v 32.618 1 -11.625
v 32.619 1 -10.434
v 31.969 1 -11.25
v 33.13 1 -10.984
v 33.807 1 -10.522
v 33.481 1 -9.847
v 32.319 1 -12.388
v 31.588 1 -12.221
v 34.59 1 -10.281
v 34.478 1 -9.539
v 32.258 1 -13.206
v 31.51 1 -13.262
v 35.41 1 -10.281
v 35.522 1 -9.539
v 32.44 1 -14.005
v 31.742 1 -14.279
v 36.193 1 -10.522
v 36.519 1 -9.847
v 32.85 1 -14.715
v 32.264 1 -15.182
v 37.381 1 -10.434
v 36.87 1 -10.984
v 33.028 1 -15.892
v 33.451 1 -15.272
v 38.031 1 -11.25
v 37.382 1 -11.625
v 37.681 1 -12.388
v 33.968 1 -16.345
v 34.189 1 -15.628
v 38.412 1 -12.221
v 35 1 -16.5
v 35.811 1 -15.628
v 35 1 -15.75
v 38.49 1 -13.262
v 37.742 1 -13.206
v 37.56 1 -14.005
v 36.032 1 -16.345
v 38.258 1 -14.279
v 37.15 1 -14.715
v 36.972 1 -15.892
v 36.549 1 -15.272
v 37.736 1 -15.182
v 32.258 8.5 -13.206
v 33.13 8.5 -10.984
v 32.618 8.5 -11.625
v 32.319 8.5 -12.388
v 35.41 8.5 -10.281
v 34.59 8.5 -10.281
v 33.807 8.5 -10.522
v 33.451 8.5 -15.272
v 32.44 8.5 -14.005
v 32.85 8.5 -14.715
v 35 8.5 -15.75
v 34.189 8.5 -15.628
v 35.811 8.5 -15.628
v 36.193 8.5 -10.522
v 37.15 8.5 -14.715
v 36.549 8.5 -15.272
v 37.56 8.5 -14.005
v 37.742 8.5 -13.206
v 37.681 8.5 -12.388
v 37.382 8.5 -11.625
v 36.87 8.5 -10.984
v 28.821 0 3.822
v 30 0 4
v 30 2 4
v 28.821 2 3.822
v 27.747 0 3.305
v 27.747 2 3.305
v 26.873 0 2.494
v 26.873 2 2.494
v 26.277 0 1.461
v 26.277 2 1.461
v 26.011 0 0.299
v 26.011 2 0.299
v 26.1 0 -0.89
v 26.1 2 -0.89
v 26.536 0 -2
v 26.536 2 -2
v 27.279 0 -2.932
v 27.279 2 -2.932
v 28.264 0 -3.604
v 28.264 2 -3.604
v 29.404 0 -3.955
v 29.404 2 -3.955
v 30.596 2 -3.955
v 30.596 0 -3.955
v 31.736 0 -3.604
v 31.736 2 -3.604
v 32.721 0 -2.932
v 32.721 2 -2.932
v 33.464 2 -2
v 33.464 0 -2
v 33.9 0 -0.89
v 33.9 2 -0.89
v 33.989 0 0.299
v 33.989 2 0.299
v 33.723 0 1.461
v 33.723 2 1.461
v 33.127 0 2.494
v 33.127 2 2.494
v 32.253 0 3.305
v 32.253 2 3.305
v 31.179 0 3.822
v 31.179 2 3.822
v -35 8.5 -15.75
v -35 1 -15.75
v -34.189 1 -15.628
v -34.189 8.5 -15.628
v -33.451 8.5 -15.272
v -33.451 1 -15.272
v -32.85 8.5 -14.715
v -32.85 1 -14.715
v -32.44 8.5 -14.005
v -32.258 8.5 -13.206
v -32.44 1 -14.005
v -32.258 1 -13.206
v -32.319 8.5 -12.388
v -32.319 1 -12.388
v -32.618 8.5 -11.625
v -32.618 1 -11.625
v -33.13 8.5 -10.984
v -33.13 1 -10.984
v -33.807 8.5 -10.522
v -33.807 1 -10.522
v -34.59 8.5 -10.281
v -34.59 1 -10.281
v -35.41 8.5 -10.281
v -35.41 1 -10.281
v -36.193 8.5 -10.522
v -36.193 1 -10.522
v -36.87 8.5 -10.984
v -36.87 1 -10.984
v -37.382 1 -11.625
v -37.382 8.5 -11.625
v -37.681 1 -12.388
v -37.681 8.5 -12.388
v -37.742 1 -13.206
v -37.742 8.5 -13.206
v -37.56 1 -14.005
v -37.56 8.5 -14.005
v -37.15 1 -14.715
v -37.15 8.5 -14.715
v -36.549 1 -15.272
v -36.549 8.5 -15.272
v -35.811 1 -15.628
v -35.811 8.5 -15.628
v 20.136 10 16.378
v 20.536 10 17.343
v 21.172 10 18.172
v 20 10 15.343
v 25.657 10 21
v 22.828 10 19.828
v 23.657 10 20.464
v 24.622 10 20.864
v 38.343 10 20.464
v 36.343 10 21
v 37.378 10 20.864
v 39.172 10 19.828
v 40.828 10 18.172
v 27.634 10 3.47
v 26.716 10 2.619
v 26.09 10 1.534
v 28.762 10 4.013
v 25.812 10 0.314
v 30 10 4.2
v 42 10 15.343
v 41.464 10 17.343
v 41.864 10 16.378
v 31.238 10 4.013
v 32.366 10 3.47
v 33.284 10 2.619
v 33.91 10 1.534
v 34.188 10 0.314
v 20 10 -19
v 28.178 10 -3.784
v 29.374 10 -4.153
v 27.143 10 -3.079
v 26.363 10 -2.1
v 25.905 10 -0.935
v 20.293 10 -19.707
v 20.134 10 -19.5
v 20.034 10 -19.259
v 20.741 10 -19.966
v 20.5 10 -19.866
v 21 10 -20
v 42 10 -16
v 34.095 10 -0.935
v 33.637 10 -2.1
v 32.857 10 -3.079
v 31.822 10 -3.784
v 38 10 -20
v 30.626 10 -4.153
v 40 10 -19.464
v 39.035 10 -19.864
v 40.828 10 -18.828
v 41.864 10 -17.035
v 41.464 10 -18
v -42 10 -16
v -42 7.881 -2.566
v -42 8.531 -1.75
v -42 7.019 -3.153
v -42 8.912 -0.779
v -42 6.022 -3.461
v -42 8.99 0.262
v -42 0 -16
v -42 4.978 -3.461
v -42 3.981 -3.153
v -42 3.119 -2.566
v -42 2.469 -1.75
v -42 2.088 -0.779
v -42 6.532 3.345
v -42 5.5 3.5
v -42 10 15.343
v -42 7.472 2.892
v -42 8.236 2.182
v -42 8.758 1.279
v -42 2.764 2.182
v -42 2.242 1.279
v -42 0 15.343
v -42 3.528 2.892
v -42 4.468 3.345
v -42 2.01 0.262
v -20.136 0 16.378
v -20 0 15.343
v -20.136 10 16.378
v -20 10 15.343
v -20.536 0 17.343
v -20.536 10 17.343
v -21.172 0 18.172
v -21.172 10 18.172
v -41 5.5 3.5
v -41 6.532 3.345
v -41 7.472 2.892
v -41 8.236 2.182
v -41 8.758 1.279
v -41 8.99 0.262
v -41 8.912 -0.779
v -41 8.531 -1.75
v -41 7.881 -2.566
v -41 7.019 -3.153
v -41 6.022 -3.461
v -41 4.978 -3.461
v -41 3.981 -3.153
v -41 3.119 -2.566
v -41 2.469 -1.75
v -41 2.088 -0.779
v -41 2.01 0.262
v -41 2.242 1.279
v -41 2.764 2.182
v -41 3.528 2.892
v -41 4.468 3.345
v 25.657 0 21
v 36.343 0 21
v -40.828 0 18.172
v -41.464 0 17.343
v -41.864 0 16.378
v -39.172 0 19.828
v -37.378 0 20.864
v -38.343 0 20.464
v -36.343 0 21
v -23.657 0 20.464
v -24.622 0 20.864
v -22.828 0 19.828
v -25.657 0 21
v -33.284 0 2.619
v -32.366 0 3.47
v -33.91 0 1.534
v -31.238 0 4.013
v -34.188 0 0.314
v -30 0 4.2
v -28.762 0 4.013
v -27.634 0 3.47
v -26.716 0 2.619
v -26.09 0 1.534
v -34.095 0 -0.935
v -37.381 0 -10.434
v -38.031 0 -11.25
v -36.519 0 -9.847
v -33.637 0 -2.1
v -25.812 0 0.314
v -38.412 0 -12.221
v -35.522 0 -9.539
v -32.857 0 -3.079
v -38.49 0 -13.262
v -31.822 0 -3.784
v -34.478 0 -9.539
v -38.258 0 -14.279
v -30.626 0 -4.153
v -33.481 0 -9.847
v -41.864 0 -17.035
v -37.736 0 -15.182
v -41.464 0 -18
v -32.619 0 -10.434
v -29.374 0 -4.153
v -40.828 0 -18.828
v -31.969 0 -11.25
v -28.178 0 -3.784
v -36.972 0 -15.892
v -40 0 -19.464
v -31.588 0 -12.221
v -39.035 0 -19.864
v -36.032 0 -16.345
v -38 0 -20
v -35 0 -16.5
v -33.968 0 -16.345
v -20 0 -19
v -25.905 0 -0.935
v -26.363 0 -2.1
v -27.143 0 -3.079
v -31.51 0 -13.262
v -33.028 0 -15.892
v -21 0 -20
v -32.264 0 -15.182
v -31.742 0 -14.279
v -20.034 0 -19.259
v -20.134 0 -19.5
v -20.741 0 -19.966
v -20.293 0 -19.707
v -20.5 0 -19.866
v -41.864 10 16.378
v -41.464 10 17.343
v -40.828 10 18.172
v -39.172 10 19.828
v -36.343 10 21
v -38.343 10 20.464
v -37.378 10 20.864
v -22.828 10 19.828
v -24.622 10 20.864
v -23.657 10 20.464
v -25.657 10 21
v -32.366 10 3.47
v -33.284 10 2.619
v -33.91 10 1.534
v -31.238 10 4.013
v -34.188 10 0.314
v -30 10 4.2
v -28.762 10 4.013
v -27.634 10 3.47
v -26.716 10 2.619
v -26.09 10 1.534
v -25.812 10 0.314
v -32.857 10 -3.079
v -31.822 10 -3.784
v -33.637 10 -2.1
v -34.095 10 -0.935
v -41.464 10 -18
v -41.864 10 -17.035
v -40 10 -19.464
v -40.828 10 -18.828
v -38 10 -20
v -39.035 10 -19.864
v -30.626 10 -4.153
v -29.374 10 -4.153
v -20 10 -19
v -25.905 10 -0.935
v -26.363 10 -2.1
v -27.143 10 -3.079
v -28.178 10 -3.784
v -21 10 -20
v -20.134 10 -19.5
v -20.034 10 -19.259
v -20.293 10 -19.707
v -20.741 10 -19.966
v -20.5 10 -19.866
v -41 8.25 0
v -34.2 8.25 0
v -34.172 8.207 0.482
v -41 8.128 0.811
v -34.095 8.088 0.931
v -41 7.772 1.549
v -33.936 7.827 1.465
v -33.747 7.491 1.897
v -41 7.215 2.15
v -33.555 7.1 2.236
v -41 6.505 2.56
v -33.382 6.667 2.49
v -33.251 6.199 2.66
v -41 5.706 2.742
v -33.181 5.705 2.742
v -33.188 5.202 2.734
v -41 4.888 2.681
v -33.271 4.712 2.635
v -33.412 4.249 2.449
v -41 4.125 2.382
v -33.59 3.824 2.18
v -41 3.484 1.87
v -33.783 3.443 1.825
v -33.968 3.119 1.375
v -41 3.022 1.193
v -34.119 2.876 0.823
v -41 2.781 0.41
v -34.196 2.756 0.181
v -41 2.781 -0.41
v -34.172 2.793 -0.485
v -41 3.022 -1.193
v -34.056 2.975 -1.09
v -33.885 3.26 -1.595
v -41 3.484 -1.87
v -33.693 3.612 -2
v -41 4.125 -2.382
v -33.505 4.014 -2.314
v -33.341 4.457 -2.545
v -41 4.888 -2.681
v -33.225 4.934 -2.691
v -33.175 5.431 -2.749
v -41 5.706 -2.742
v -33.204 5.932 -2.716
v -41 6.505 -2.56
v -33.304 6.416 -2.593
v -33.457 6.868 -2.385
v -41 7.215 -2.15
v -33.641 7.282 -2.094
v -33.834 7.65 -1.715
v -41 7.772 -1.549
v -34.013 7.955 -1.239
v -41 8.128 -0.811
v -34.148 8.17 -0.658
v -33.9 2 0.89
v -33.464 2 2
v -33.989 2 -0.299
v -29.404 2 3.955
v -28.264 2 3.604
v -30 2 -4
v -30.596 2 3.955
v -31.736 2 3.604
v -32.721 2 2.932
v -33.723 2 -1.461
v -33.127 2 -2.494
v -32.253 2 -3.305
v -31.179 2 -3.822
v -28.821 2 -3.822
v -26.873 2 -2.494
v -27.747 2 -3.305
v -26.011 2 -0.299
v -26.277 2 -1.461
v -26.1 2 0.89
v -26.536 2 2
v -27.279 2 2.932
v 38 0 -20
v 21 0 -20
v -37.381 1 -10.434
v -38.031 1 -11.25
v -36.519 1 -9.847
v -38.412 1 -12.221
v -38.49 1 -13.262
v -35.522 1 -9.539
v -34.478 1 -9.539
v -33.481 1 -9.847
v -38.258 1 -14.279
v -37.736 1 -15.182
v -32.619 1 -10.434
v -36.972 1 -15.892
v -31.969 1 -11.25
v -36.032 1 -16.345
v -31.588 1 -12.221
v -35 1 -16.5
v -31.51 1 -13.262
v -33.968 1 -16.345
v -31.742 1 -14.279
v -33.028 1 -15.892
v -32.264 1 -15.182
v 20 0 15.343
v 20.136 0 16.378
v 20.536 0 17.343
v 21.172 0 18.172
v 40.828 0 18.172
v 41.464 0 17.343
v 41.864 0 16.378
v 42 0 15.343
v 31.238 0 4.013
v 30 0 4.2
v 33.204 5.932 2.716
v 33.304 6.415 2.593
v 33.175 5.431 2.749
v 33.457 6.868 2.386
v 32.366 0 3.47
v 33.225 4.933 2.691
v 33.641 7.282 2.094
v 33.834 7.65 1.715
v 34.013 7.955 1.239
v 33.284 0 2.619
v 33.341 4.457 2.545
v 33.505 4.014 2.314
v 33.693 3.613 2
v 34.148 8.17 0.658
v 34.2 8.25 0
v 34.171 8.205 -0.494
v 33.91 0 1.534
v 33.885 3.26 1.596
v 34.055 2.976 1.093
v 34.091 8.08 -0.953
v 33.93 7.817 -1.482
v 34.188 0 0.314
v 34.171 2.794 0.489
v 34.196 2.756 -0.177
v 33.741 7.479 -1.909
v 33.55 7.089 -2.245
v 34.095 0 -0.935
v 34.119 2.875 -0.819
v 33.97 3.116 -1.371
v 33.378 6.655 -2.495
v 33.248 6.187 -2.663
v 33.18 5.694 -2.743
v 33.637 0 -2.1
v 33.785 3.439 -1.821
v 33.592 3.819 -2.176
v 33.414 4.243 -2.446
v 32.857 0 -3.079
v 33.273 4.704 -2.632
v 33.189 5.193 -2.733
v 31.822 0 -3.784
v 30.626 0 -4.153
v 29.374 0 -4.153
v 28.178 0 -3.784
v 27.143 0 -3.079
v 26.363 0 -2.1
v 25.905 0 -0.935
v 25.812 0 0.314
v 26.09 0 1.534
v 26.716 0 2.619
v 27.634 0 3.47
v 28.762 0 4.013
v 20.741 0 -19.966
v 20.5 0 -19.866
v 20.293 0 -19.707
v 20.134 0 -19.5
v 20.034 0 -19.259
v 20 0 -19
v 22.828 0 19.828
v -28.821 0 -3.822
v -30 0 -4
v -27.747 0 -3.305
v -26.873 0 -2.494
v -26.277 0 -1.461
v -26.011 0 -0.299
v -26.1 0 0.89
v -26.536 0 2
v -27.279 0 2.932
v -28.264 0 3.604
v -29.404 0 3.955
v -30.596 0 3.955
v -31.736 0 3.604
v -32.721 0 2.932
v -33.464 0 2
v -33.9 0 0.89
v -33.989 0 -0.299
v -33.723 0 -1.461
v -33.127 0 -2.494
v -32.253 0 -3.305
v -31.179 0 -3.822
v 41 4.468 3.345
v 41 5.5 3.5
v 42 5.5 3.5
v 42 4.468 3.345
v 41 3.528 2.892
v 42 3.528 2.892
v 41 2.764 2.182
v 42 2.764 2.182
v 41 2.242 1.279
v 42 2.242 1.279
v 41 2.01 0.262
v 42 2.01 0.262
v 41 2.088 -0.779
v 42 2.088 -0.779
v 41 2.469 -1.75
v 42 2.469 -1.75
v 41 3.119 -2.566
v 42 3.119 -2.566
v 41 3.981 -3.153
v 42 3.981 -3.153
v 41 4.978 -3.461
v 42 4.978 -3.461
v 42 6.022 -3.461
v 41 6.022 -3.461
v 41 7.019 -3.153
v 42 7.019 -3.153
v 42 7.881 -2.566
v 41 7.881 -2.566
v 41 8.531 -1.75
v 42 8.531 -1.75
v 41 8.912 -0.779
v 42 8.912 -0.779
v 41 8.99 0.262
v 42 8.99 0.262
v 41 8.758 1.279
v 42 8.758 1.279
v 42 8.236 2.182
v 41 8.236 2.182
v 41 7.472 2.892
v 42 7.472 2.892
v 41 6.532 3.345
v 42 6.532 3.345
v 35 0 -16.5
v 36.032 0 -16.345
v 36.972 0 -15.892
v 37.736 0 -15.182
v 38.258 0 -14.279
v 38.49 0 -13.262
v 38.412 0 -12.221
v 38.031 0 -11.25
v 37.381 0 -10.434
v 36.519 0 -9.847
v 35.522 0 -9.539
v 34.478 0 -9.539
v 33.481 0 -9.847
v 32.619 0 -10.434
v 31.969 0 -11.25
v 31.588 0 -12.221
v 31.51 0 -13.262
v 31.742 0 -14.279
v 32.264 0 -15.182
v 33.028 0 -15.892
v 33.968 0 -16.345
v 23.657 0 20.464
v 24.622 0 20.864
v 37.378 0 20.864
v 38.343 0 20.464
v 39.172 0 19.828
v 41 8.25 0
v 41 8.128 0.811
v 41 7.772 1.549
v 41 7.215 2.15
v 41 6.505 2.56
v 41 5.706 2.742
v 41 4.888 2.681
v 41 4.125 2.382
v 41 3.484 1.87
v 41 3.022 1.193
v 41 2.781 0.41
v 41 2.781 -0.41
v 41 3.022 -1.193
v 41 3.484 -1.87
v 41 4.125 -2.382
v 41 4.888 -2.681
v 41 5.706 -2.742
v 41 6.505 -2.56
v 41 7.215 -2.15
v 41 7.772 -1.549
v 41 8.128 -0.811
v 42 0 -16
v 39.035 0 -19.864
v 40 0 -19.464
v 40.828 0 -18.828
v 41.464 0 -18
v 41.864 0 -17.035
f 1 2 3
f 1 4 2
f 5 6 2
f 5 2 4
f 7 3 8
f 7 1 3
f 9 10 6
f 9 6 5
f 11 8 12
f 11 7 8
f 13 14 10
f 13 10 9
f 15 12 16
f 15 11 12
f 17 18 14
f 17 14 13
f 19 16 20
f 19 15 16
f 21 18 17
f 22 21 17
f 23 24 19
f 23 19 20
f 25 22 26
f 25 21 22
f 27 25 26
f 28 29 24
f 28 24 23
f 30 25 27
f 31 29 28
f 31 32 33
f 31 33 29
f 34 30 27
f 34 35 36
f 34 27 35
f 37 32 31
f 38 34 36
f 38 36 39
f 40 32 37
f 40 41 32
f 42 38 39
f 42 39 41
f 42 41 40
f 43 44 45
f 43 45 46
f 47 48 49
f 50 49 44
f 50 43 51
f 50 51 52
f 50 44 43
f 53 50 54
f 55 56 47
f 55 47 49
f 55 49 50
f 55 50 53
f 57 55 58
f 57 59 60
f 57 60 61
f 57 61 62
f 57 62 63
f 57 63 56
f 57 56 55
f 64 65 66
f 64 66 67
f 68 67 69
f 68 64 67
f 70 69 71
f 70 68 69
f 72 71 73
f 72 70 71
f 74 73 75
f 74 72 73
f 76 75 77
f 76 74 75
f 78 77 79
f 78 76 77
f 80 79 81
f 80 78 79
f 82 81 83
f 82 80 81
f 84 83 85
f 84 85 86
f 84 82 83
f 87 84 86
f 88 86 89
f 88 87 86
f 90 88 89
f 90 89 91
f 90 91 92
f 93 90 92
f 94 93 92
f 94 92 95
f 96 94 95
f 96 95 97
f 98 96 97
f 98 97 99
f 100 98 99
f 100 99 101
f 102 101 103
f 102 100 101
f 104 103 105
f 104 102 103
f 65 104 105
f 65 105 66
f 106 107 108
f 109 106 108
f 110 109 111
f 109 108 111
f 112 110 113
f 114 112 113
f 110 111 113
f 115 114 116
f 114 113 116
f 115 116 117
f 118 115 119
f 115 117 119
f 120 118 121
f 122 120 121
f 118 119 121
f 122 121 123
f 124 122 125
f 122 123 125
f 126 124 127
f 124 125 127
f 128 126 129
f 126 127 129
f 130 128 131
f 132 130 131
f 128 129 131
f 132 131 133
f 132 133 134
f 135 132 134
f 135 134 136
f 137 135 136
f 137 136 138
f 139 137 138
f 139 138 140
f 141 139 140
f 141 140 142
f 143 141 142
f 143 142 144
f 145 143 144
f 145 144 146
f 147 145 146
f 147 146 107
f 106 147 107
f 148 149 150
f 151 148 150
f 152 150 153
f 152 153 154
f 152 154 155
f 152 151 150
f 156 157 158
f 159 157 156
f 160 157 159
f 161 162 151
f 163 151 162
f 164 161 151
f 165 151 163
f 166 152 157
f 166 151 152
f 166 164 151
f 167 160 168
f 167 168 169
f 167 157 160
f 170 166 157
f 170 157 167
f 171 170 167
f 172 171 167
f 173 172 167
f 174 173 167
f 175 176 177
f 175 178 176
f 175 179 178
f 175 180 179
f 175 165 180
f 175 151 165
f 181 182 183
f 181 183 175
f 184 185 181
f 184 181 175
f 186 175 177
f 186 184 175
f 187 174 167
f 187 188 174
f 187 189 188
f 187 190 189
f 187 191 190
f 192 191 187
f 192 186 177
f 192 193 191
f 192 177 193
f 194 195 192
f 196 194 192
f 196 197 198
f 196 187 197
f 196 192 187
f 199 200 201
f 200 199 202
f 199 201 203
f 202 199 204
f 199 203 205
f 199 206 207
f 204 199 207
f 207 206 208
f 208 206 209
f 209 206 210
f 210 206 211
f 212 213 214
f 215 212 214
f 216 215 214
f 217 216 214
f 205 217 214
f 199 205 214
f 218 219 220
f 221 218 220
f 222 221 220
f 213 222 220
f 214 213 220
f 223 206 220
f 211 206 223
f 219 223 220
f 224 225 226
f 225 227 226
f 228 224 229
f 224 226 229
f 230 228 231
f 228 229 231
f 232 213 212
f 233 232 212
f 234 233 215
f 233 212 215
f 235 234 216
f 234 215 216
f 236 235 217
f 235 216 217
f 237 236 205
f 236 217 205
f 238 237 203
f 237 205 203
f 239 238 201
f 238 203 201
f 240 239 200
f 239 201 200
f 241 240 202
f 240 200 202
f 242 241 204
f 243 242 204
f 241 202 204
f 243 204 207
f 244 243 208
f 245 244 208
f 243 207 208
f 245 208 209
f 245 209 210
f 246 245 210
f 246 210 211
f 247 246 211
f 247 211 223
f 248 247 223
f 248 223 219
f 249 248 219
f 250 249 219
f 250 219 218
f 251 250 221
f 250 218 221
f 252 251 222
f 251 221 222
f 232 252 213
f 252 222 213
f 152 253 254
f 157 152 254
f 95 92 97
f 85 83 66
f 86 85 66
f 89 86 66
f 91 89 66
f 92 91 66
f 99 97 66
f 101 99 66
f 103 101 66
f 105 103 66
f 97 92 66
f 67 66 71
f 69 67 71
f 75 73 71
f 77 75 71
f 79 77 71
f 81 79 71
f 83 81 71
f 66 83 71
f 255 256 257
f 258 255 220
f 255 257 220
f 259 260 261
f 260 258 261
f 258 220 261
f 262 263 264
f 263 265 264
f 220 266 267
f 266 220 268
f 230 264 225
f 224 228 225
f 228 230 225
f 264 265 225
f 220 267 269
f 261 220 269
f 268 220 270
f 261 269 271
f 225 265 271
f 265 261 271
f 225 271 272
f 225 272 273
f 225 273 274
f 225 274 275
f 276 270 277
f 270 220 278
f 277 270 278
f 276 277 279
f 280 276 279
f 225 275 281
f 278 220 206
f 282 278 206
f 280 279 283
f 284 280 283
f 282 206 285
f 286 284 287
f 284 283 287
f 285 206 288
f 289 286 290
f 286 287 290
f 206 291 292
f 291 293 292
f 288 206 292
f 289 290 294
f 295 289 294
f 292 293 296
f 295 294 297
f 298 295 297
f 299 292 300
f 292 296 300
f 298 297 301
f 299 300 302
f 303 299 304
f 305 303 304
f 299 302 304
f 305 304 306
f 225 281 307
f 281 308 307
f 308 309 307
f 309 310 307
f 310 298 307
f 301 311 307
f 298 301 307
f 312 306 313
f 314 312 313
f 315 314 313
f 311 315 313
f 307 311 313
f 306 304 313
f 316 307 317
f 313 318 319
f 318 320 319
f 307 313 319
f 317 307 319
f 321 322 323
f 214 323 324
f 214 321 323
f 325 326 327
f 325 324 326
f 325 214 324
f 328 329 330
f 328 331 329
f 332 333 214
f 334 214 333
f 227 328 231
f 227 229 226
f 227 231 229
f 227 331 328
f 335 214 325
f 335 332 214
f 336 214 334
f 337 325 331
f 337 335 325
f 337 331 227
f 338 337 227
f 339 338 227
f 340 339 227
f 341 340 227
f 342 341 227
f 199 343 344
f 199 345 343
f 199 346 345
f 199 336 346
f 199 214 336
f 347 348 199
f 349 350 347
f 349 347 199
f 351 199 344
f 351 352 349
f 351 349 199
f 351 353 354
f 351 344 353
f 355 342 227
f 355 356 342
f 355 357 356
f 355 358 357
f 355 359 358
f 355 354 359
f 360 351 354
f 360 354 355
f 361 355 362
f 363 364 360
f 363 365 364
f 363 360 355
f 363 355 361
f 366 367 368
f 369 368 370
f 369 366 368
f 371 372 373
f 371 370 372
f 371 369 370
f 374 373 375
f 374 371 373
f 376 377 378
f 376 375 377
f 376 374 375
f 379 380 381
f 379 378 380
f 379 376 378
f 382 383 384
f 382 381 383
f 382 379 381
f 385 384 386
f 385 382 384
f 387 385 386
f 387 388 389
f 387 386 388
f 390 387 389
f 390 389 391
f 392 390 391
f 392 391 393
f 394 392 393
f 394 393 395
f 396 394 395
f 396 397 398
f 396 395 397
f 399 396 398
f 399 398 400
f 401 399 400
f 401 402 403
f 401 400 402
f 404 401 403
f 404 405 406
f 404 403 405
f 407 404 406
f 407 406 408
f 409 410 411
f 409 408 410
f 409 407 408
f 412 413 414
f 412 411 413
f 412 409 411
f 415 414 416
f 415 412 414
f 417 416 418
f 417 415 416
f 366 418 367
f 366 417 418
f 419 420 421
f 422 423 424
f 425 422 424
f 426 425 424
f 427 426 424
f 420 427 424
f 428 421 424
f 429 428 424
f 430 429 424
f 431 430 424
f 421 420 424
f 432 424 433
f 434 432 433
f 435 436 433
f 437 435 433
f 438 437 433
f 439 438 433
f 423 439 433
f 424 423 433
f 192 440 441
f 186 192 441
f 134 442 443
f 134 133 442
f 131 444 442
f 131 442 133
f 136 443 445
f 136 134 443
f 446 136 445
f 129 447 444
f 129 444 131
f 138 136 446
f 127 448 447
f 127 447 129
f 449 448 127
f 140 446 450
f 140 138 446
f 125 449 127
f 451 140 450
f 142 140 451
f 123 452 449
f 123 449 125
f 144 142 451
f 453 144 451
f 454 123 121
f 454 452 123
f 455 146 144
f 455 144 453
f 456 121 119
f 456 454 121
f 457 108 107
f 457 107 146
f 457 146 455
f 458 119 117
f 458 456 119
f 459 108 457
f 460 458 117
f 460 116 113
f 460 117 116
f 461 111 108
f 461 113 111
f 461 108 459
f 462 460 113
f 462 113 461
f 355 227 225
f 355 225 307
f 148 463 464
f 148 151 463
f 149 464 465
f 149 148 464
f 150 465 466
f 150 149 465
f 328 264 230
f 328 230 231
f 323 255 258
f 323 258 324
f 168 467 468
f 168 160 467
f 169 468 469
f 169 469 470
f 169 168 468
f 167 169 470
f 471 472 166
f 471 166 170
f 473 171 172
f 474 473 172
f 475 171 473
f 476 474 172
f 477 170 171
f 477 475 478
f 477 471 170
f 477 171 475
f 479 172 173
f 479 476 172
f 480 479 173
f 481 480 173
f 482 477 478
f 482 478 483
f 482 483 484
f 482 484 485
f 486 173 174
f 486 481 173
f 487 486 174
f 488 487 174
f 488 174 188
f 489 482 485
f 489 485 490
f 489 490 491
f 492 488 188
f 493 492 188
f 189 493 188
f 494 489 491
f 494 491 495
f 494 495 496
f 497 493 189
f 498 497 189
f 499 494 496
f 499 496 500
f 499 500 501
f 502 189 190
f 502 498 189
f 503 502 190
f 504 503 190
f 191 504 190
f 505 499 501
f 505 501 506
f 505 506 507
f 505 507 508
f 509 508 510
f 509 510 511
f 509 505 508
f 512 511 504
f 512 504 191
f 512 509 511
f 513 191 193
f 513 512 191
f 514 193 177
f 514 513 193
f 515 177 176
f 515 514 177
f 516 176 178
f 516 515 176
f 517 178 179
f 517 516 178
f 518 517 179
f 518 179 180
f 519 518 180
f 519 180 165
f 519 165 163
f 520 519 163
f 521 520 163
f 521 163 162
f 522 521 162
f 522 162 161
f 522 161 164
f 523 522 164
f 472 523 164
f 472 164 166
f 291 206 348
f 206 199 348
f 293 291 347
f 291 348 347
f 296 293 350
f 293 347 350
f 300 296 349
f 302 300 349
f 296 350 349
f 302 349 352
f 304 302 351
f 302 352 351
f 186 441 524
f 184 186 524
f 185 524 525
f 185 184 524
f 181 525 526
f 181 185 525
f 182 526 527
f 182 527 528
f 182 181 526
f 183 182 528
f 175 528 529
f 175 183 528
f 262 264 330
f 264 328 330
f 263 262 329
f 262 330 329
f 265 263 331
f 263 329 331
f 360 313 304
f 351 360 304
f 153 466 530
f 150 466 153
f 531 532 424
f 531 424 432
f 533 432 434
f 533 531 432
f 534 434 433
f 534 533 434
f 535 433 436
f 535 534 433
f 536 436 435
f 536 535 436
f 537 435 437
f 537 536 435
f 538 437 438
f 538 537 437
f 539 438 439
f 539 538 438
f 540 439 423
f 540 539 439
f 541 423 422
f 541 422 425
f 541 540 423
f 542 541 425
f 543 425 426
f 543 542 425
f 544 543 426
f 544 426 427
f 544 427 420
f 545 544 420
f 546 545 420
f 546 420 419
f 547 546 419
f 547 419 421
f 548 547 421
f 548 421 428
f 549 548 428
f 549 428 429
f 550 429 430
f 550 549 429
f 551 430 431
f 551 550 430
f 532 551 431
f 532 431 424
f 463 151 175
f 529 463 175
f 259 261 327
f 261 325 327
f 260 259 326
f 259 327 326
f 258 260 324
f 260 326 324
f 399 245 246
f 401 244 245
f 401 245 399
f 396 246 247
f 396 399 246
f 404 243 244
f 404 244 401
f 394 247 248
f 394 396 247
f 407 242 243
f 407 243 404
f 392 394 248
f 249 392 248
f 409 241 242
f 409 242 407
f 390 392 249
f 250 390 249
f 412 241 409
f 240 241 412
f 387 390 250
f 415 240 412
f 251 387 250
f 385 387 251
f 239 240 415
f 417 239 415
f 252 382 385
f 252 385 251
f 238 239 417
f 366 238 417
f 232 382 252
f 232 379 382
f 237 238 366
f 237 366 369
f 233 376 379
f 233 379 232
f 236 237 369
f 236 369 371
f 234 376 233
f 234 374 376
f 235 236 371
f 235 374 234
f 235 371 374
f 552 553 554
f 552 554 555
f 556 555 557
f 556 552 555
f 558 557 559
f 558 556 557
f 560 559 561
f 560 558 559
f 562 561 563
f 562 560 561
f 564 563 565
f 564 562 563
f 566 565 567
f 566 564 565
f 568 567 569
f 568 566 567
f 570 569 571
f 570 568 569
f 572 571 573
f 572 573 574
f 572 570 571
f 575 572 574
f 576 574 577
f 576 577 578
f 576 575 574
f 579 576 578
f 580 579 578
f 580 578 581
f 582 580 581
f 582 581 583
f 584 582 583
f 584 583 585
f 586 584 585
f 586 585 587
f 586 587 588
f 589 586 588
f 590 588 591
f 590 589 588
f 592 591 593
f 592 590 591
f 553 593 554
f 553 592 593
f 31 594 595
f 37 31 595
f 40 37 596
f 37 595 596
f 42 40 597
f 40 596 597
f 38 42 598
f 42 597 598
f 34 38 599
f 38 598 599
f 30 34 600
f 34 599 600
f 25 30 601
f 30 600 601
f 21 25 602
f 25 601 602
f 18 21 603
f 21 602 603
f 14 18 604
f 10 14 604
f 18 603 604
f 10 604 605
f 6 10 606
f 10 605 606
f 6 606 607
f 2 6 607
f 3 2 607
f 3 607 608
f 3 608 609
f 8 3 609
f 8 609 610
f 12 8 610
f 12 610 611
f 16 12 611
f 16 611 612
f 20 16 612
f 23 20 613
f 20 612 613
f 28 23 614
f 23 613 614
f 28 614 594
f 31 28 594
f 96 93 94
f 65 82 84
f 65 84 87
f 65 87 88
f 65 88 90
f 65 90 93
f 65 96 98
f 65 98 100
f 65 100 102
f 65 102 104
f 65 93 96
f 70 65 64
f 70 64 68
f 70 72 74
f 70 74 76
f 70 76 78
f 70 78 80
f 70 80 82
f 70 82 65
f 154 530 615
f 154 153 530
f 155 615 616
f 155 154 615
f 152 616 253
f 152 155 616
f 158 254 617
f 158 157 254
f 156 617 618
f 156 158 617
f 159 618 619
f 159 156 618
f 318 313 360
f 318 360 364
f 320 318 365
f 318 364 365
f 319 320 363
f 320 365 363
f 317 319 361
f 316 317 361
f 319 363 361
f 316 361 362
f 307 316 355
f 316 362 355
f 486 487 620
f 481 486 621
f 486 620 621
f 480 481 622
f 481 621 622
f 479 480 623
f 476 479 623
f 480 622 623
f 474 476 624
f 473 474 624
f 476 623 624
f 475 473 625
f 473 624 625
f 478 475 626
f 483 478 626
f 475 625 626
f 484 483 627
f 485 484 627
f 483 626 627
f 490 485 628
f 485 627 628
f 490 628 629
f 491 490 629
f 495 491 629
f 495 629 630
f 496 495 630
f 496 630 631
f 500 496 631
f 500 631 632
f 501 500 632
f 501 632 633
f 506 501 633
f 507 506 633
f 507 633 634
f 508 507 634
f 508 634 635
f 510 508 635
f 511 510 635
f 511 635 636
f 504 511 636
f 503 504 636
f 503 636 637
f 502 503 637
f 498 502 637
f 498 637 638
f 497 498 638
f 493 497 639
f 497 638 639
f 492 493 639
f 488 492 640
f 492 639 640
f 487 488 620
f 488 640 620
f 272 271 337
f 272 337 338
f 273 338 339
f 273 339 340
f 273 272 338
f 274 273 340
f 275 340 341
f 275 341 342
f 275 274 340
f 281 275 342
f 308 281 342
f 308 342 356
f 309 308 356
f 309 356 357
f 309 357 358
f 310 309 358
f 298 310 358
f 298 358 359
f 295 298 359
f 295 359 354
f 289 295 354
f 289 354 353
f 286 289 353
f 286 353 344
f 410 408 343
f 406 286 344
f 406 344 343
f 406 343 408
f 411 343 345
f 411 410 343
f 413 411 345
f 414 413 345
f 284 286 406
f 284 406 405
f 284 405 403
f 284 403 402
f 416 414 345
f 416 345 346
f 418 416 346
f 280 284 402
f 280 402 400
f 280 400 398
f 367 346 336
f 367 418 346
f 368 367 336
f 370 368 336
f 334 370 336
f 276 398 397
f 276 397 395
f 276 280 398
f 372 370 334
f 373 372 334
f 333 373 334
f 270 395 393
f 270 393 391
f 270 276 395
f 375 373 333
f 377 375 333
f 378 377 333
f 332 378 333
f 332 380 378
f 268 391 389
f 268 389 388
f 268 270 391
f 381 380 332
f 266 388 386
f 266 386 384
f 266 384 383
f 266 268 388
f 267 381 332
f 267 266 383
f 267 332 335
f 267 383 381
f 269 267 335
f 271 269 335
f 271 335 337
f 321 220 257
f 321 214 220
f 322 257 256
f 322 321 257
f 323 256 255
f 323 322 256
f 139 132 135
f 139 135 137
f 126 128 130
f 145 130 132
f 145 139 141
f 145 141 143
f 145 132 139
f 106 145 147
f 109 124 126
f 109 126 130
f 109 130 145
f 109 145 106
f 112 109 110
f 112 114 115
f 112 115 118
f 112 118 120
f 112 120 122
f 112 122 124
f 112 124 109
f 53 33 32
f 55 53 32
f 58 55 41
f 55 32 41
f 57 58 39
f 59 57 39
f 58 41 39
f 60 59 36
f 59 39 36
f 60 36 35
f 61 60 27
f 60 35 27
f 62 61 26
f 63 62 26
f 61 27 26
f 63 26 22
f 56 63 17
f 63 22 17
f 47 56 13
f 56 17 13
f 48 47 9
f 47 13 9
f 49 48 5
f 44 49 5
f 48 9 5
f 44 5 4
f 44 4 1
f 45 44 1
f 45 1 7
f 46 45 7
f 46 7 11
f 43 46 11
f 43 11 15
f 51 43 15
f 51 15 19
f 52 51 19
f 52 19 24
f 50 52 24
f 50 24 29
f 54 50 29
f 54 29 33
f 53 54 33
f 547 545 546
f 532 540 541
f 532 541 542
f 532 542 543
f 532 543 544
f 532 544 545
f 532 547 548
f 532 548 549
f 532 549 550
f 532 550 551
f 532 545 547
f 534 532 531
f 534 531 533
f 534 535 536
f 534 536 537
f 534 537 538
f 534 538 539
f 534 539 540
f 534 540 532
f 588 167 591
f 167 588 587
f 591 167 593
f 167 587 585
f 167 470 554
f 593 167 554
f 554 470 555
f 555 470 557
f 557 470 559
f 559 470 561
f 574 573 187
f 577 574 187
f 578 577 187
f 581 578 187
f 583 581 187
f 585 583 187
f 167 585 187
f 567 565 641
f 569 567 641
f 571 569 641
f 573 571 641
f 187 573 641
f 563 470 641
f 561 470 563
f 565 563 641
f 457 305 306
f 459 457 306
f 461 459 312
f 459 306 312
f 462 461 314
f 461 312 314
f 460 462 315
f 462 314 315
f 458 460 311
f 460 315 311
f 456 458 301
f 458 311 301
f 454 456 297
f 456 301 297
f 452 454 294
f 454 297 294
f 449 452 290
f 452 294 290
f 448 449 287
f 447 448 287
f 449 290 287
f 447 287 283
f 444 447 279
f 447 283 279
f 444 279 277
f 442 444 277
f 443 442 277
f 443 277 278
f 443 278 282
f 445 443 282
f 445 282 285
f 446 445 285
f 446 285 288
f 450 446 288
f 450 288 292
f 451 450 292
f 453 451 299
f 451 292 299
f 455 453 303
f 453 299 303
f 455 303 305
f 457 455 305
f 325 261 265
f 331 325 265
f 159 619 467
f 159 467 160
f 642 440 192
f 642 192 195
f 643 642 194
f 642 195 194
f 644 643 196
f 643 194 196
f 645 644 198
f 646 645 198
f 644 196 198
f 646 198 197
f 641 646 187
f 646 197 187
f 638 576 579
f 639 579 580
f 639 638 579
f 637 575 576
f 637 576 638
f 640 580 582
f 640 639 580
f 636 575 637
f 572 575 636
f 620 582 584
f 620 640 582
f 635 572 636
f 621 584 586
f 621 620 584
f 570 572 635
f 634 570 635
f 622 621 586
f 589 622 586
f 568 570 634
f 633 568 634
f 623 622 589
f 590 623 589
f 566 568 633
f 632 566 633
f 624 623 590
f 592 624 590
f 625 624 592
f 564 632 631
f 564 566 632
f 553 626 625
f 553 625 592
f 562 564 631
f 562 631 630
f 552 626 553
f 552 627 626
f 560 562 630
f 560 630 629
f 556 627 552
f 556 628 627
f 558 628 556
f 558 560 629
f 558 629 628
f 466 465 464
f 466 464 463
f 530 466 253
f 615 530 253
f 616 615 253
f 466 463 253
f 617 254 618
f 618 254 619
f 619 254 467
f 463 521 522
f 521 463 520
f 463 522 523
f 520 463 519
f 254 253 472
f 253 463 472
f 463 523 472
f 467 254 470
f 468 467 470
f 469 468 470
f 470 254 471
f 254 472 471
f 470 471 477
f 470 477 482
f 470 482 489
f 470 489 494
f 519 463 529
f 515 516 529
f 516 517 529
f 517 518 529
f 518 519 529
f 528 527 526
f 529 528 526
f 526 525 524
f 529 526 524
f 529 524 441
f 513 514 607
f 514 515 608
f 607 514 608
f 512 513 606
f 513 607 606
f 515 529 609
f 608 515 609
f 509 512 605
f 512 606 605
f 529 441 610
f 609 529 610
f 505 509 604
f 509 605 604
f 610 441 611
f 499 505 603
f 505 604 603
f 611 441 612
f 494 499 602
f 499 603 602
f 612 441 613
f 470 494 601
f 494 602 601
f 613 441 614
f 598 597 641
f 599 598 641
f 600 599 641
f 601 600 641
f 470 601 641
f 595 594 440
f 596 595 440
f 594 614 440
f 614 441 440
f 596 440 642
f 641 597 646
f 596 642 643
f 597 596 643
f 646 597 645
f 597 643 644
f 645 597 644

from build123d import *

# Parameters (mm, degrees)
ESQUISSE1_R                 = 4.2
BOSS_EXTRU_1_DEPTH          = 10
CHANFREIN3_SIZE             = 4
CONG_2_R                    = 4
ESQUISSE3_R                 = 4
BOSS_EXTRU_2_DEPTH          = 2
BOSS_EXTRU_2_2_DEPTH        = 2
ENL_V_START                 = -42
ENL_V_MAT_EXTRU_4_OUTLINE_R = 2.75
ENL_V_MAT_EXTRU_4_DEPTH     = 8.825492271
CONG_4_R                    = 4
ESQUISSE7_R                 = 2.75
ENL_V_MAT_EXTRU_5_DEPTH     = 8.5
ESQUISSE7_4_R               = 3.5
ESQUISSE7_4_R_2             = 2.75
ENL_V_MAT_EXTRU_8_DEPTH     = 1
ESQUISSE8_R                 = 3.5
ENL_V_MAT_EXTRU_9_DEPTH     = 1
ENL_V_START_2               = -1
ESQUISSE9_R                 = 3.5
ENL_V_MAT_EXTRU_10_DEPTH    = 1
ESQUISSE10_W                = 40
ESQUISSE10_H                = 50.736146746
ENL_V_MAT_EXTRU_11_DEPTH    = 10
CONG_5_R                    = 1
CONG_6_R                    = 1


# Read off the part's stored shape, not the designer's step: Enlèv. mat.-Extru.4
with BuildPart() as part:
    # Esquisse1 → Boss.-Extru.1 (new body)
    # profile 1 of 4: a face of its own
    with BuildSketch(Plane(origin=(0, 0, 0), x_dir=(1, 0, 0), z_dir=(0, 1, 0))):
        Polygon((-20, 6.5), (-20, 12), (-20, 13.5), (-15, 13.5), (0, 13.5), (0, 20), (-42, 20), (-42, 12), (-42, 0), (-42, -21), (-20, -21), align=None)
        with Locations(Location((-30, 0, 0), (0, 0, 270))):
            Circle(ESQUISSE1_R, mode=Mode.SUBTRACT)
    # profile 2 of 4: a face of its own
    with BuildSketch(Plane(origin=(0, 0, 0), x_dir=(1, 0, 0), z_dir=(0, 1, 0))):
        Polygon((0, 20), (0, 13.5), (15, 13.5), (20, 13.5), (20, 12), (20, 6.5), (20, -21), (42, -21), (42, 0), (42, 12), (42, 20), align=None)
        with Locations(Location((30, 0, 0), (0, 0, 270))):
            Circle(ESQUISSE1_R, mode=Mode.SUBTRACT)
    # profile 3 of 4: a face of its own
    with BuildSketch(Plane(origin=(0, 0, 0), x_dir=(1, 0, 0), z_dir=(0, 1, 0))):
        Polygon((-20, 13.5), (-20, 12), (-20, 6.5), (-15, 13.5), align=None)
    # profile 4 of 4: a face of its own
    with BuildSketch(Plane(origin=(0, 0, 0), x_dir=(1, 0, 0), z_dir=(0, 1, 0))):
        Polygon((20, 13.5), (15, 13.5), (20, 6.5), (20, 12), align=None)
    extrude(amount=BOSS_EXTRU_1_DEPTH)

    # Chanfrein3
    chanfrein3_edges = [part.edges().sort_by_distance(p)[0] for p in [
        (-20, 5, 21),
        (-42, 5, 21),
        (42, 5, 21),
        (20, 5, 21),
    ]]
    chamfer(chanfrein3_edges, length=CHANFREIN3_SIZE)

    # Congé2
    cong_2_edges = [part.edges().sort_by_distance(p)[0] for p in [
        (42, 5, 17),
        (24, 5, 21),
        (38, 5, 21),
        (20, 5, 17),
        (-24, 5, 21),
        (-38, 5, 21),
        (-42, 5, 17),
        (-20, 5, 17),
    ]]
    fillet(cong_2_edges, radius=CONG_2_R)

    # Enlèv. mat.-Extru.4 outline → Enlèv. mat.-Extru.4 (cut)
    with BuildSketch(Plane.YZ.offset(ENL_V_START)):
        with Locations((5.5, 0)):
            Circle(ENL_V_MAT_EXTRU_4_OUTLINE_R)
    enl_v_mat_extru_4 = extrude(amount=ENL_V_MAT_EXTRU_4_DEPTH, mode=Mode.SUBTRACT)

    # Symétrie10: Enlèv. mat.-Extru.4 across plane
    add(enl_v_mat_extru_4.mirror(Plane(origin=(0, 0, 0), x_dir=(0, 0, 1), z_dir=(1, 0, 0))), mode=Mode.SUBTRACT)

    # Congé4
    cong_4_edges = [part.edges().sort_by_distance(p)[0] for p in [
        (-42, 5, -20),
        (42, 5, -20),
        (20, 5, -6.5),
        (15, 5, -13.5),
        (-15, 5, -13.5),
        (-20, 5, -6.5),
    ]]
    fillet(cong_4_edges, radius=CONG_4_R)

    # Esquisse7 → Enlèv. mat.-Extru.5 (cut)
    with BuildSketch(Plane.XZ):
        with Locations(Location((-35, -13, 0), (0, 0, 270))):
            Circle(ESQUISSE7_R)
        with Locations(Location((35, -13, 0), (0, 0, 270))):
            Circle(ESQUISSE7_R)
    extrude(amount=-ENL_V_MAT_EXTRU_5_DEPTH, mode=Mode.SUBTRACT)

    # Esquisse7<4> → Enlèv. mat.-Extru.8 (cut)
    # profile 1 of 2: a face of its own
    with BuildSketch(Plane.XZ):
        with Locations(Location((-35, -13, 0), (0, 0, 270))):
            Circle(ESQUISSE7_4_R)
        with Locations(Location((-35, -13, 0), (0, 0, 270))):
            Circle(ESQUISSE7_4_R_2, mode=Mode.SUBTRACT)
    # profile 2 of 2: a face of its own
    with BuildSketch(Plane.XZ):
        with Locations(Location((35, -13, 0), (0, 0, 270))):
            Circle(ESQUISSE7_4_R)
        with Locations(Location((35, -13, 0), (0, 0, 270))):
            Circle(ESQUISSE7_4_R_2, mode=Mode.SUBTRACT)
    extrude(amount=-ENL_V_MAT_EXTRU_8_DEPTH, mode=Mode.SUBTRACT)

    # Esquisse8 → Enlèv. mat.-Extru.9 (cut)
    with BuildSketch(Plane.ZY.offset(42)):
        with Locations((0, 5.5)):
            Circle(ESQUISSE8_R)
    extrude(amount=-ENL_V_MAT_EXTRU_9_DEPTH, mode=Mode.SUBTRACT)

    # Esquisse9 → Enlèv. mat.-Extru.10 (cut)
    with BuildSketch(Plane(origin=(42, 0, 0), x_dir=(0, 0, -1), z_dir=(1, 0, 0)).offset(ENL_V_START_2)):
        with Locations(Location((0, 5.5, 0), (0, 0, 180))):
            Circle(ESQUISSE9_R)
    extrude(amount=ENL_V_MAT_EXTRU_10_DEPTH, mode=Mode.SUBTRACT)

    # Esquisse10 → Enlèv. mat.-Extru.11 (cut)
    with BuildSketch(Plane(origin=(0, 10, 0), x_dir=(1, 0, 0), z_dir=(0, 1, 0))):
        Rectangle(ESQUISSE10_W, ESQUISSE10_H)
    extrude(amount=-ENL_V_MAT_EXTRU_11_DEPTH, mode=Mode.SUBTRACT)


with BuildPart() as body_2:
    # Esquisse3 → Boss.-Extru.2 (new body)
    with BuildSketch(Plane.XZ):
        with Locations(Location((-30, 0, 0), (0, 0, 270))):
            Circle(ESQUISSE3_R)
    extrude(amount=-BOSS_EXTRU_2_DEPTH)


with BuildPart() as body_3:
    # Esquisse3 → Boss.-Extru.2 2 (new body)
    with BuildSketch(Plane.XZ):
        with Locations(Location((30, 0, 0), (0, 0, 90))):
            Circle(ESQUISSE3_R)
    extrude(amount=-BOSS_EXTRU_2_2_DEPTH)


with BuildPart() as enl_v_mat_extru_11_piece_1:
    # of the separate pieces the step leaves, piece 1, a body of its own (enl_v_mat_extru_11_pieces)
    add(part.part.solids().sort_by_distance((-42, 0, -16))[0])

    # Congé5
    cong_5_edges = [enl_v_mat_extru_11_piece_1.edges().sort_by_distance(p)[0] for p in [
        (-20, 5, -20),
    ]]
    fillet(cong_5_edges, radius=CONG_5_R)


with BuildPart() as enl_v_mat_extru_11_piece_2:
    # of the separate pieces the step leaves, piece 2, a body of its own (enl_v_mat_extru_11_pieces)
    add(part.part.solids().sort_by_distance((20, 0, -20))[0])

    # Congé6
    cong_6_edges = [enl_v_mat_extru_11_piece_2.edges().sort_by_distance(p)[0] for p in [
        (20, 5, -20),
    ]]
    fillet(cong_6_edges, radius=CONG_6_R)


solid = Compound([body_2.part, body_3.part, enl_v_mat_extru_11_piece_1.part, enl_v_mat_extru_11_piece_2.part])
